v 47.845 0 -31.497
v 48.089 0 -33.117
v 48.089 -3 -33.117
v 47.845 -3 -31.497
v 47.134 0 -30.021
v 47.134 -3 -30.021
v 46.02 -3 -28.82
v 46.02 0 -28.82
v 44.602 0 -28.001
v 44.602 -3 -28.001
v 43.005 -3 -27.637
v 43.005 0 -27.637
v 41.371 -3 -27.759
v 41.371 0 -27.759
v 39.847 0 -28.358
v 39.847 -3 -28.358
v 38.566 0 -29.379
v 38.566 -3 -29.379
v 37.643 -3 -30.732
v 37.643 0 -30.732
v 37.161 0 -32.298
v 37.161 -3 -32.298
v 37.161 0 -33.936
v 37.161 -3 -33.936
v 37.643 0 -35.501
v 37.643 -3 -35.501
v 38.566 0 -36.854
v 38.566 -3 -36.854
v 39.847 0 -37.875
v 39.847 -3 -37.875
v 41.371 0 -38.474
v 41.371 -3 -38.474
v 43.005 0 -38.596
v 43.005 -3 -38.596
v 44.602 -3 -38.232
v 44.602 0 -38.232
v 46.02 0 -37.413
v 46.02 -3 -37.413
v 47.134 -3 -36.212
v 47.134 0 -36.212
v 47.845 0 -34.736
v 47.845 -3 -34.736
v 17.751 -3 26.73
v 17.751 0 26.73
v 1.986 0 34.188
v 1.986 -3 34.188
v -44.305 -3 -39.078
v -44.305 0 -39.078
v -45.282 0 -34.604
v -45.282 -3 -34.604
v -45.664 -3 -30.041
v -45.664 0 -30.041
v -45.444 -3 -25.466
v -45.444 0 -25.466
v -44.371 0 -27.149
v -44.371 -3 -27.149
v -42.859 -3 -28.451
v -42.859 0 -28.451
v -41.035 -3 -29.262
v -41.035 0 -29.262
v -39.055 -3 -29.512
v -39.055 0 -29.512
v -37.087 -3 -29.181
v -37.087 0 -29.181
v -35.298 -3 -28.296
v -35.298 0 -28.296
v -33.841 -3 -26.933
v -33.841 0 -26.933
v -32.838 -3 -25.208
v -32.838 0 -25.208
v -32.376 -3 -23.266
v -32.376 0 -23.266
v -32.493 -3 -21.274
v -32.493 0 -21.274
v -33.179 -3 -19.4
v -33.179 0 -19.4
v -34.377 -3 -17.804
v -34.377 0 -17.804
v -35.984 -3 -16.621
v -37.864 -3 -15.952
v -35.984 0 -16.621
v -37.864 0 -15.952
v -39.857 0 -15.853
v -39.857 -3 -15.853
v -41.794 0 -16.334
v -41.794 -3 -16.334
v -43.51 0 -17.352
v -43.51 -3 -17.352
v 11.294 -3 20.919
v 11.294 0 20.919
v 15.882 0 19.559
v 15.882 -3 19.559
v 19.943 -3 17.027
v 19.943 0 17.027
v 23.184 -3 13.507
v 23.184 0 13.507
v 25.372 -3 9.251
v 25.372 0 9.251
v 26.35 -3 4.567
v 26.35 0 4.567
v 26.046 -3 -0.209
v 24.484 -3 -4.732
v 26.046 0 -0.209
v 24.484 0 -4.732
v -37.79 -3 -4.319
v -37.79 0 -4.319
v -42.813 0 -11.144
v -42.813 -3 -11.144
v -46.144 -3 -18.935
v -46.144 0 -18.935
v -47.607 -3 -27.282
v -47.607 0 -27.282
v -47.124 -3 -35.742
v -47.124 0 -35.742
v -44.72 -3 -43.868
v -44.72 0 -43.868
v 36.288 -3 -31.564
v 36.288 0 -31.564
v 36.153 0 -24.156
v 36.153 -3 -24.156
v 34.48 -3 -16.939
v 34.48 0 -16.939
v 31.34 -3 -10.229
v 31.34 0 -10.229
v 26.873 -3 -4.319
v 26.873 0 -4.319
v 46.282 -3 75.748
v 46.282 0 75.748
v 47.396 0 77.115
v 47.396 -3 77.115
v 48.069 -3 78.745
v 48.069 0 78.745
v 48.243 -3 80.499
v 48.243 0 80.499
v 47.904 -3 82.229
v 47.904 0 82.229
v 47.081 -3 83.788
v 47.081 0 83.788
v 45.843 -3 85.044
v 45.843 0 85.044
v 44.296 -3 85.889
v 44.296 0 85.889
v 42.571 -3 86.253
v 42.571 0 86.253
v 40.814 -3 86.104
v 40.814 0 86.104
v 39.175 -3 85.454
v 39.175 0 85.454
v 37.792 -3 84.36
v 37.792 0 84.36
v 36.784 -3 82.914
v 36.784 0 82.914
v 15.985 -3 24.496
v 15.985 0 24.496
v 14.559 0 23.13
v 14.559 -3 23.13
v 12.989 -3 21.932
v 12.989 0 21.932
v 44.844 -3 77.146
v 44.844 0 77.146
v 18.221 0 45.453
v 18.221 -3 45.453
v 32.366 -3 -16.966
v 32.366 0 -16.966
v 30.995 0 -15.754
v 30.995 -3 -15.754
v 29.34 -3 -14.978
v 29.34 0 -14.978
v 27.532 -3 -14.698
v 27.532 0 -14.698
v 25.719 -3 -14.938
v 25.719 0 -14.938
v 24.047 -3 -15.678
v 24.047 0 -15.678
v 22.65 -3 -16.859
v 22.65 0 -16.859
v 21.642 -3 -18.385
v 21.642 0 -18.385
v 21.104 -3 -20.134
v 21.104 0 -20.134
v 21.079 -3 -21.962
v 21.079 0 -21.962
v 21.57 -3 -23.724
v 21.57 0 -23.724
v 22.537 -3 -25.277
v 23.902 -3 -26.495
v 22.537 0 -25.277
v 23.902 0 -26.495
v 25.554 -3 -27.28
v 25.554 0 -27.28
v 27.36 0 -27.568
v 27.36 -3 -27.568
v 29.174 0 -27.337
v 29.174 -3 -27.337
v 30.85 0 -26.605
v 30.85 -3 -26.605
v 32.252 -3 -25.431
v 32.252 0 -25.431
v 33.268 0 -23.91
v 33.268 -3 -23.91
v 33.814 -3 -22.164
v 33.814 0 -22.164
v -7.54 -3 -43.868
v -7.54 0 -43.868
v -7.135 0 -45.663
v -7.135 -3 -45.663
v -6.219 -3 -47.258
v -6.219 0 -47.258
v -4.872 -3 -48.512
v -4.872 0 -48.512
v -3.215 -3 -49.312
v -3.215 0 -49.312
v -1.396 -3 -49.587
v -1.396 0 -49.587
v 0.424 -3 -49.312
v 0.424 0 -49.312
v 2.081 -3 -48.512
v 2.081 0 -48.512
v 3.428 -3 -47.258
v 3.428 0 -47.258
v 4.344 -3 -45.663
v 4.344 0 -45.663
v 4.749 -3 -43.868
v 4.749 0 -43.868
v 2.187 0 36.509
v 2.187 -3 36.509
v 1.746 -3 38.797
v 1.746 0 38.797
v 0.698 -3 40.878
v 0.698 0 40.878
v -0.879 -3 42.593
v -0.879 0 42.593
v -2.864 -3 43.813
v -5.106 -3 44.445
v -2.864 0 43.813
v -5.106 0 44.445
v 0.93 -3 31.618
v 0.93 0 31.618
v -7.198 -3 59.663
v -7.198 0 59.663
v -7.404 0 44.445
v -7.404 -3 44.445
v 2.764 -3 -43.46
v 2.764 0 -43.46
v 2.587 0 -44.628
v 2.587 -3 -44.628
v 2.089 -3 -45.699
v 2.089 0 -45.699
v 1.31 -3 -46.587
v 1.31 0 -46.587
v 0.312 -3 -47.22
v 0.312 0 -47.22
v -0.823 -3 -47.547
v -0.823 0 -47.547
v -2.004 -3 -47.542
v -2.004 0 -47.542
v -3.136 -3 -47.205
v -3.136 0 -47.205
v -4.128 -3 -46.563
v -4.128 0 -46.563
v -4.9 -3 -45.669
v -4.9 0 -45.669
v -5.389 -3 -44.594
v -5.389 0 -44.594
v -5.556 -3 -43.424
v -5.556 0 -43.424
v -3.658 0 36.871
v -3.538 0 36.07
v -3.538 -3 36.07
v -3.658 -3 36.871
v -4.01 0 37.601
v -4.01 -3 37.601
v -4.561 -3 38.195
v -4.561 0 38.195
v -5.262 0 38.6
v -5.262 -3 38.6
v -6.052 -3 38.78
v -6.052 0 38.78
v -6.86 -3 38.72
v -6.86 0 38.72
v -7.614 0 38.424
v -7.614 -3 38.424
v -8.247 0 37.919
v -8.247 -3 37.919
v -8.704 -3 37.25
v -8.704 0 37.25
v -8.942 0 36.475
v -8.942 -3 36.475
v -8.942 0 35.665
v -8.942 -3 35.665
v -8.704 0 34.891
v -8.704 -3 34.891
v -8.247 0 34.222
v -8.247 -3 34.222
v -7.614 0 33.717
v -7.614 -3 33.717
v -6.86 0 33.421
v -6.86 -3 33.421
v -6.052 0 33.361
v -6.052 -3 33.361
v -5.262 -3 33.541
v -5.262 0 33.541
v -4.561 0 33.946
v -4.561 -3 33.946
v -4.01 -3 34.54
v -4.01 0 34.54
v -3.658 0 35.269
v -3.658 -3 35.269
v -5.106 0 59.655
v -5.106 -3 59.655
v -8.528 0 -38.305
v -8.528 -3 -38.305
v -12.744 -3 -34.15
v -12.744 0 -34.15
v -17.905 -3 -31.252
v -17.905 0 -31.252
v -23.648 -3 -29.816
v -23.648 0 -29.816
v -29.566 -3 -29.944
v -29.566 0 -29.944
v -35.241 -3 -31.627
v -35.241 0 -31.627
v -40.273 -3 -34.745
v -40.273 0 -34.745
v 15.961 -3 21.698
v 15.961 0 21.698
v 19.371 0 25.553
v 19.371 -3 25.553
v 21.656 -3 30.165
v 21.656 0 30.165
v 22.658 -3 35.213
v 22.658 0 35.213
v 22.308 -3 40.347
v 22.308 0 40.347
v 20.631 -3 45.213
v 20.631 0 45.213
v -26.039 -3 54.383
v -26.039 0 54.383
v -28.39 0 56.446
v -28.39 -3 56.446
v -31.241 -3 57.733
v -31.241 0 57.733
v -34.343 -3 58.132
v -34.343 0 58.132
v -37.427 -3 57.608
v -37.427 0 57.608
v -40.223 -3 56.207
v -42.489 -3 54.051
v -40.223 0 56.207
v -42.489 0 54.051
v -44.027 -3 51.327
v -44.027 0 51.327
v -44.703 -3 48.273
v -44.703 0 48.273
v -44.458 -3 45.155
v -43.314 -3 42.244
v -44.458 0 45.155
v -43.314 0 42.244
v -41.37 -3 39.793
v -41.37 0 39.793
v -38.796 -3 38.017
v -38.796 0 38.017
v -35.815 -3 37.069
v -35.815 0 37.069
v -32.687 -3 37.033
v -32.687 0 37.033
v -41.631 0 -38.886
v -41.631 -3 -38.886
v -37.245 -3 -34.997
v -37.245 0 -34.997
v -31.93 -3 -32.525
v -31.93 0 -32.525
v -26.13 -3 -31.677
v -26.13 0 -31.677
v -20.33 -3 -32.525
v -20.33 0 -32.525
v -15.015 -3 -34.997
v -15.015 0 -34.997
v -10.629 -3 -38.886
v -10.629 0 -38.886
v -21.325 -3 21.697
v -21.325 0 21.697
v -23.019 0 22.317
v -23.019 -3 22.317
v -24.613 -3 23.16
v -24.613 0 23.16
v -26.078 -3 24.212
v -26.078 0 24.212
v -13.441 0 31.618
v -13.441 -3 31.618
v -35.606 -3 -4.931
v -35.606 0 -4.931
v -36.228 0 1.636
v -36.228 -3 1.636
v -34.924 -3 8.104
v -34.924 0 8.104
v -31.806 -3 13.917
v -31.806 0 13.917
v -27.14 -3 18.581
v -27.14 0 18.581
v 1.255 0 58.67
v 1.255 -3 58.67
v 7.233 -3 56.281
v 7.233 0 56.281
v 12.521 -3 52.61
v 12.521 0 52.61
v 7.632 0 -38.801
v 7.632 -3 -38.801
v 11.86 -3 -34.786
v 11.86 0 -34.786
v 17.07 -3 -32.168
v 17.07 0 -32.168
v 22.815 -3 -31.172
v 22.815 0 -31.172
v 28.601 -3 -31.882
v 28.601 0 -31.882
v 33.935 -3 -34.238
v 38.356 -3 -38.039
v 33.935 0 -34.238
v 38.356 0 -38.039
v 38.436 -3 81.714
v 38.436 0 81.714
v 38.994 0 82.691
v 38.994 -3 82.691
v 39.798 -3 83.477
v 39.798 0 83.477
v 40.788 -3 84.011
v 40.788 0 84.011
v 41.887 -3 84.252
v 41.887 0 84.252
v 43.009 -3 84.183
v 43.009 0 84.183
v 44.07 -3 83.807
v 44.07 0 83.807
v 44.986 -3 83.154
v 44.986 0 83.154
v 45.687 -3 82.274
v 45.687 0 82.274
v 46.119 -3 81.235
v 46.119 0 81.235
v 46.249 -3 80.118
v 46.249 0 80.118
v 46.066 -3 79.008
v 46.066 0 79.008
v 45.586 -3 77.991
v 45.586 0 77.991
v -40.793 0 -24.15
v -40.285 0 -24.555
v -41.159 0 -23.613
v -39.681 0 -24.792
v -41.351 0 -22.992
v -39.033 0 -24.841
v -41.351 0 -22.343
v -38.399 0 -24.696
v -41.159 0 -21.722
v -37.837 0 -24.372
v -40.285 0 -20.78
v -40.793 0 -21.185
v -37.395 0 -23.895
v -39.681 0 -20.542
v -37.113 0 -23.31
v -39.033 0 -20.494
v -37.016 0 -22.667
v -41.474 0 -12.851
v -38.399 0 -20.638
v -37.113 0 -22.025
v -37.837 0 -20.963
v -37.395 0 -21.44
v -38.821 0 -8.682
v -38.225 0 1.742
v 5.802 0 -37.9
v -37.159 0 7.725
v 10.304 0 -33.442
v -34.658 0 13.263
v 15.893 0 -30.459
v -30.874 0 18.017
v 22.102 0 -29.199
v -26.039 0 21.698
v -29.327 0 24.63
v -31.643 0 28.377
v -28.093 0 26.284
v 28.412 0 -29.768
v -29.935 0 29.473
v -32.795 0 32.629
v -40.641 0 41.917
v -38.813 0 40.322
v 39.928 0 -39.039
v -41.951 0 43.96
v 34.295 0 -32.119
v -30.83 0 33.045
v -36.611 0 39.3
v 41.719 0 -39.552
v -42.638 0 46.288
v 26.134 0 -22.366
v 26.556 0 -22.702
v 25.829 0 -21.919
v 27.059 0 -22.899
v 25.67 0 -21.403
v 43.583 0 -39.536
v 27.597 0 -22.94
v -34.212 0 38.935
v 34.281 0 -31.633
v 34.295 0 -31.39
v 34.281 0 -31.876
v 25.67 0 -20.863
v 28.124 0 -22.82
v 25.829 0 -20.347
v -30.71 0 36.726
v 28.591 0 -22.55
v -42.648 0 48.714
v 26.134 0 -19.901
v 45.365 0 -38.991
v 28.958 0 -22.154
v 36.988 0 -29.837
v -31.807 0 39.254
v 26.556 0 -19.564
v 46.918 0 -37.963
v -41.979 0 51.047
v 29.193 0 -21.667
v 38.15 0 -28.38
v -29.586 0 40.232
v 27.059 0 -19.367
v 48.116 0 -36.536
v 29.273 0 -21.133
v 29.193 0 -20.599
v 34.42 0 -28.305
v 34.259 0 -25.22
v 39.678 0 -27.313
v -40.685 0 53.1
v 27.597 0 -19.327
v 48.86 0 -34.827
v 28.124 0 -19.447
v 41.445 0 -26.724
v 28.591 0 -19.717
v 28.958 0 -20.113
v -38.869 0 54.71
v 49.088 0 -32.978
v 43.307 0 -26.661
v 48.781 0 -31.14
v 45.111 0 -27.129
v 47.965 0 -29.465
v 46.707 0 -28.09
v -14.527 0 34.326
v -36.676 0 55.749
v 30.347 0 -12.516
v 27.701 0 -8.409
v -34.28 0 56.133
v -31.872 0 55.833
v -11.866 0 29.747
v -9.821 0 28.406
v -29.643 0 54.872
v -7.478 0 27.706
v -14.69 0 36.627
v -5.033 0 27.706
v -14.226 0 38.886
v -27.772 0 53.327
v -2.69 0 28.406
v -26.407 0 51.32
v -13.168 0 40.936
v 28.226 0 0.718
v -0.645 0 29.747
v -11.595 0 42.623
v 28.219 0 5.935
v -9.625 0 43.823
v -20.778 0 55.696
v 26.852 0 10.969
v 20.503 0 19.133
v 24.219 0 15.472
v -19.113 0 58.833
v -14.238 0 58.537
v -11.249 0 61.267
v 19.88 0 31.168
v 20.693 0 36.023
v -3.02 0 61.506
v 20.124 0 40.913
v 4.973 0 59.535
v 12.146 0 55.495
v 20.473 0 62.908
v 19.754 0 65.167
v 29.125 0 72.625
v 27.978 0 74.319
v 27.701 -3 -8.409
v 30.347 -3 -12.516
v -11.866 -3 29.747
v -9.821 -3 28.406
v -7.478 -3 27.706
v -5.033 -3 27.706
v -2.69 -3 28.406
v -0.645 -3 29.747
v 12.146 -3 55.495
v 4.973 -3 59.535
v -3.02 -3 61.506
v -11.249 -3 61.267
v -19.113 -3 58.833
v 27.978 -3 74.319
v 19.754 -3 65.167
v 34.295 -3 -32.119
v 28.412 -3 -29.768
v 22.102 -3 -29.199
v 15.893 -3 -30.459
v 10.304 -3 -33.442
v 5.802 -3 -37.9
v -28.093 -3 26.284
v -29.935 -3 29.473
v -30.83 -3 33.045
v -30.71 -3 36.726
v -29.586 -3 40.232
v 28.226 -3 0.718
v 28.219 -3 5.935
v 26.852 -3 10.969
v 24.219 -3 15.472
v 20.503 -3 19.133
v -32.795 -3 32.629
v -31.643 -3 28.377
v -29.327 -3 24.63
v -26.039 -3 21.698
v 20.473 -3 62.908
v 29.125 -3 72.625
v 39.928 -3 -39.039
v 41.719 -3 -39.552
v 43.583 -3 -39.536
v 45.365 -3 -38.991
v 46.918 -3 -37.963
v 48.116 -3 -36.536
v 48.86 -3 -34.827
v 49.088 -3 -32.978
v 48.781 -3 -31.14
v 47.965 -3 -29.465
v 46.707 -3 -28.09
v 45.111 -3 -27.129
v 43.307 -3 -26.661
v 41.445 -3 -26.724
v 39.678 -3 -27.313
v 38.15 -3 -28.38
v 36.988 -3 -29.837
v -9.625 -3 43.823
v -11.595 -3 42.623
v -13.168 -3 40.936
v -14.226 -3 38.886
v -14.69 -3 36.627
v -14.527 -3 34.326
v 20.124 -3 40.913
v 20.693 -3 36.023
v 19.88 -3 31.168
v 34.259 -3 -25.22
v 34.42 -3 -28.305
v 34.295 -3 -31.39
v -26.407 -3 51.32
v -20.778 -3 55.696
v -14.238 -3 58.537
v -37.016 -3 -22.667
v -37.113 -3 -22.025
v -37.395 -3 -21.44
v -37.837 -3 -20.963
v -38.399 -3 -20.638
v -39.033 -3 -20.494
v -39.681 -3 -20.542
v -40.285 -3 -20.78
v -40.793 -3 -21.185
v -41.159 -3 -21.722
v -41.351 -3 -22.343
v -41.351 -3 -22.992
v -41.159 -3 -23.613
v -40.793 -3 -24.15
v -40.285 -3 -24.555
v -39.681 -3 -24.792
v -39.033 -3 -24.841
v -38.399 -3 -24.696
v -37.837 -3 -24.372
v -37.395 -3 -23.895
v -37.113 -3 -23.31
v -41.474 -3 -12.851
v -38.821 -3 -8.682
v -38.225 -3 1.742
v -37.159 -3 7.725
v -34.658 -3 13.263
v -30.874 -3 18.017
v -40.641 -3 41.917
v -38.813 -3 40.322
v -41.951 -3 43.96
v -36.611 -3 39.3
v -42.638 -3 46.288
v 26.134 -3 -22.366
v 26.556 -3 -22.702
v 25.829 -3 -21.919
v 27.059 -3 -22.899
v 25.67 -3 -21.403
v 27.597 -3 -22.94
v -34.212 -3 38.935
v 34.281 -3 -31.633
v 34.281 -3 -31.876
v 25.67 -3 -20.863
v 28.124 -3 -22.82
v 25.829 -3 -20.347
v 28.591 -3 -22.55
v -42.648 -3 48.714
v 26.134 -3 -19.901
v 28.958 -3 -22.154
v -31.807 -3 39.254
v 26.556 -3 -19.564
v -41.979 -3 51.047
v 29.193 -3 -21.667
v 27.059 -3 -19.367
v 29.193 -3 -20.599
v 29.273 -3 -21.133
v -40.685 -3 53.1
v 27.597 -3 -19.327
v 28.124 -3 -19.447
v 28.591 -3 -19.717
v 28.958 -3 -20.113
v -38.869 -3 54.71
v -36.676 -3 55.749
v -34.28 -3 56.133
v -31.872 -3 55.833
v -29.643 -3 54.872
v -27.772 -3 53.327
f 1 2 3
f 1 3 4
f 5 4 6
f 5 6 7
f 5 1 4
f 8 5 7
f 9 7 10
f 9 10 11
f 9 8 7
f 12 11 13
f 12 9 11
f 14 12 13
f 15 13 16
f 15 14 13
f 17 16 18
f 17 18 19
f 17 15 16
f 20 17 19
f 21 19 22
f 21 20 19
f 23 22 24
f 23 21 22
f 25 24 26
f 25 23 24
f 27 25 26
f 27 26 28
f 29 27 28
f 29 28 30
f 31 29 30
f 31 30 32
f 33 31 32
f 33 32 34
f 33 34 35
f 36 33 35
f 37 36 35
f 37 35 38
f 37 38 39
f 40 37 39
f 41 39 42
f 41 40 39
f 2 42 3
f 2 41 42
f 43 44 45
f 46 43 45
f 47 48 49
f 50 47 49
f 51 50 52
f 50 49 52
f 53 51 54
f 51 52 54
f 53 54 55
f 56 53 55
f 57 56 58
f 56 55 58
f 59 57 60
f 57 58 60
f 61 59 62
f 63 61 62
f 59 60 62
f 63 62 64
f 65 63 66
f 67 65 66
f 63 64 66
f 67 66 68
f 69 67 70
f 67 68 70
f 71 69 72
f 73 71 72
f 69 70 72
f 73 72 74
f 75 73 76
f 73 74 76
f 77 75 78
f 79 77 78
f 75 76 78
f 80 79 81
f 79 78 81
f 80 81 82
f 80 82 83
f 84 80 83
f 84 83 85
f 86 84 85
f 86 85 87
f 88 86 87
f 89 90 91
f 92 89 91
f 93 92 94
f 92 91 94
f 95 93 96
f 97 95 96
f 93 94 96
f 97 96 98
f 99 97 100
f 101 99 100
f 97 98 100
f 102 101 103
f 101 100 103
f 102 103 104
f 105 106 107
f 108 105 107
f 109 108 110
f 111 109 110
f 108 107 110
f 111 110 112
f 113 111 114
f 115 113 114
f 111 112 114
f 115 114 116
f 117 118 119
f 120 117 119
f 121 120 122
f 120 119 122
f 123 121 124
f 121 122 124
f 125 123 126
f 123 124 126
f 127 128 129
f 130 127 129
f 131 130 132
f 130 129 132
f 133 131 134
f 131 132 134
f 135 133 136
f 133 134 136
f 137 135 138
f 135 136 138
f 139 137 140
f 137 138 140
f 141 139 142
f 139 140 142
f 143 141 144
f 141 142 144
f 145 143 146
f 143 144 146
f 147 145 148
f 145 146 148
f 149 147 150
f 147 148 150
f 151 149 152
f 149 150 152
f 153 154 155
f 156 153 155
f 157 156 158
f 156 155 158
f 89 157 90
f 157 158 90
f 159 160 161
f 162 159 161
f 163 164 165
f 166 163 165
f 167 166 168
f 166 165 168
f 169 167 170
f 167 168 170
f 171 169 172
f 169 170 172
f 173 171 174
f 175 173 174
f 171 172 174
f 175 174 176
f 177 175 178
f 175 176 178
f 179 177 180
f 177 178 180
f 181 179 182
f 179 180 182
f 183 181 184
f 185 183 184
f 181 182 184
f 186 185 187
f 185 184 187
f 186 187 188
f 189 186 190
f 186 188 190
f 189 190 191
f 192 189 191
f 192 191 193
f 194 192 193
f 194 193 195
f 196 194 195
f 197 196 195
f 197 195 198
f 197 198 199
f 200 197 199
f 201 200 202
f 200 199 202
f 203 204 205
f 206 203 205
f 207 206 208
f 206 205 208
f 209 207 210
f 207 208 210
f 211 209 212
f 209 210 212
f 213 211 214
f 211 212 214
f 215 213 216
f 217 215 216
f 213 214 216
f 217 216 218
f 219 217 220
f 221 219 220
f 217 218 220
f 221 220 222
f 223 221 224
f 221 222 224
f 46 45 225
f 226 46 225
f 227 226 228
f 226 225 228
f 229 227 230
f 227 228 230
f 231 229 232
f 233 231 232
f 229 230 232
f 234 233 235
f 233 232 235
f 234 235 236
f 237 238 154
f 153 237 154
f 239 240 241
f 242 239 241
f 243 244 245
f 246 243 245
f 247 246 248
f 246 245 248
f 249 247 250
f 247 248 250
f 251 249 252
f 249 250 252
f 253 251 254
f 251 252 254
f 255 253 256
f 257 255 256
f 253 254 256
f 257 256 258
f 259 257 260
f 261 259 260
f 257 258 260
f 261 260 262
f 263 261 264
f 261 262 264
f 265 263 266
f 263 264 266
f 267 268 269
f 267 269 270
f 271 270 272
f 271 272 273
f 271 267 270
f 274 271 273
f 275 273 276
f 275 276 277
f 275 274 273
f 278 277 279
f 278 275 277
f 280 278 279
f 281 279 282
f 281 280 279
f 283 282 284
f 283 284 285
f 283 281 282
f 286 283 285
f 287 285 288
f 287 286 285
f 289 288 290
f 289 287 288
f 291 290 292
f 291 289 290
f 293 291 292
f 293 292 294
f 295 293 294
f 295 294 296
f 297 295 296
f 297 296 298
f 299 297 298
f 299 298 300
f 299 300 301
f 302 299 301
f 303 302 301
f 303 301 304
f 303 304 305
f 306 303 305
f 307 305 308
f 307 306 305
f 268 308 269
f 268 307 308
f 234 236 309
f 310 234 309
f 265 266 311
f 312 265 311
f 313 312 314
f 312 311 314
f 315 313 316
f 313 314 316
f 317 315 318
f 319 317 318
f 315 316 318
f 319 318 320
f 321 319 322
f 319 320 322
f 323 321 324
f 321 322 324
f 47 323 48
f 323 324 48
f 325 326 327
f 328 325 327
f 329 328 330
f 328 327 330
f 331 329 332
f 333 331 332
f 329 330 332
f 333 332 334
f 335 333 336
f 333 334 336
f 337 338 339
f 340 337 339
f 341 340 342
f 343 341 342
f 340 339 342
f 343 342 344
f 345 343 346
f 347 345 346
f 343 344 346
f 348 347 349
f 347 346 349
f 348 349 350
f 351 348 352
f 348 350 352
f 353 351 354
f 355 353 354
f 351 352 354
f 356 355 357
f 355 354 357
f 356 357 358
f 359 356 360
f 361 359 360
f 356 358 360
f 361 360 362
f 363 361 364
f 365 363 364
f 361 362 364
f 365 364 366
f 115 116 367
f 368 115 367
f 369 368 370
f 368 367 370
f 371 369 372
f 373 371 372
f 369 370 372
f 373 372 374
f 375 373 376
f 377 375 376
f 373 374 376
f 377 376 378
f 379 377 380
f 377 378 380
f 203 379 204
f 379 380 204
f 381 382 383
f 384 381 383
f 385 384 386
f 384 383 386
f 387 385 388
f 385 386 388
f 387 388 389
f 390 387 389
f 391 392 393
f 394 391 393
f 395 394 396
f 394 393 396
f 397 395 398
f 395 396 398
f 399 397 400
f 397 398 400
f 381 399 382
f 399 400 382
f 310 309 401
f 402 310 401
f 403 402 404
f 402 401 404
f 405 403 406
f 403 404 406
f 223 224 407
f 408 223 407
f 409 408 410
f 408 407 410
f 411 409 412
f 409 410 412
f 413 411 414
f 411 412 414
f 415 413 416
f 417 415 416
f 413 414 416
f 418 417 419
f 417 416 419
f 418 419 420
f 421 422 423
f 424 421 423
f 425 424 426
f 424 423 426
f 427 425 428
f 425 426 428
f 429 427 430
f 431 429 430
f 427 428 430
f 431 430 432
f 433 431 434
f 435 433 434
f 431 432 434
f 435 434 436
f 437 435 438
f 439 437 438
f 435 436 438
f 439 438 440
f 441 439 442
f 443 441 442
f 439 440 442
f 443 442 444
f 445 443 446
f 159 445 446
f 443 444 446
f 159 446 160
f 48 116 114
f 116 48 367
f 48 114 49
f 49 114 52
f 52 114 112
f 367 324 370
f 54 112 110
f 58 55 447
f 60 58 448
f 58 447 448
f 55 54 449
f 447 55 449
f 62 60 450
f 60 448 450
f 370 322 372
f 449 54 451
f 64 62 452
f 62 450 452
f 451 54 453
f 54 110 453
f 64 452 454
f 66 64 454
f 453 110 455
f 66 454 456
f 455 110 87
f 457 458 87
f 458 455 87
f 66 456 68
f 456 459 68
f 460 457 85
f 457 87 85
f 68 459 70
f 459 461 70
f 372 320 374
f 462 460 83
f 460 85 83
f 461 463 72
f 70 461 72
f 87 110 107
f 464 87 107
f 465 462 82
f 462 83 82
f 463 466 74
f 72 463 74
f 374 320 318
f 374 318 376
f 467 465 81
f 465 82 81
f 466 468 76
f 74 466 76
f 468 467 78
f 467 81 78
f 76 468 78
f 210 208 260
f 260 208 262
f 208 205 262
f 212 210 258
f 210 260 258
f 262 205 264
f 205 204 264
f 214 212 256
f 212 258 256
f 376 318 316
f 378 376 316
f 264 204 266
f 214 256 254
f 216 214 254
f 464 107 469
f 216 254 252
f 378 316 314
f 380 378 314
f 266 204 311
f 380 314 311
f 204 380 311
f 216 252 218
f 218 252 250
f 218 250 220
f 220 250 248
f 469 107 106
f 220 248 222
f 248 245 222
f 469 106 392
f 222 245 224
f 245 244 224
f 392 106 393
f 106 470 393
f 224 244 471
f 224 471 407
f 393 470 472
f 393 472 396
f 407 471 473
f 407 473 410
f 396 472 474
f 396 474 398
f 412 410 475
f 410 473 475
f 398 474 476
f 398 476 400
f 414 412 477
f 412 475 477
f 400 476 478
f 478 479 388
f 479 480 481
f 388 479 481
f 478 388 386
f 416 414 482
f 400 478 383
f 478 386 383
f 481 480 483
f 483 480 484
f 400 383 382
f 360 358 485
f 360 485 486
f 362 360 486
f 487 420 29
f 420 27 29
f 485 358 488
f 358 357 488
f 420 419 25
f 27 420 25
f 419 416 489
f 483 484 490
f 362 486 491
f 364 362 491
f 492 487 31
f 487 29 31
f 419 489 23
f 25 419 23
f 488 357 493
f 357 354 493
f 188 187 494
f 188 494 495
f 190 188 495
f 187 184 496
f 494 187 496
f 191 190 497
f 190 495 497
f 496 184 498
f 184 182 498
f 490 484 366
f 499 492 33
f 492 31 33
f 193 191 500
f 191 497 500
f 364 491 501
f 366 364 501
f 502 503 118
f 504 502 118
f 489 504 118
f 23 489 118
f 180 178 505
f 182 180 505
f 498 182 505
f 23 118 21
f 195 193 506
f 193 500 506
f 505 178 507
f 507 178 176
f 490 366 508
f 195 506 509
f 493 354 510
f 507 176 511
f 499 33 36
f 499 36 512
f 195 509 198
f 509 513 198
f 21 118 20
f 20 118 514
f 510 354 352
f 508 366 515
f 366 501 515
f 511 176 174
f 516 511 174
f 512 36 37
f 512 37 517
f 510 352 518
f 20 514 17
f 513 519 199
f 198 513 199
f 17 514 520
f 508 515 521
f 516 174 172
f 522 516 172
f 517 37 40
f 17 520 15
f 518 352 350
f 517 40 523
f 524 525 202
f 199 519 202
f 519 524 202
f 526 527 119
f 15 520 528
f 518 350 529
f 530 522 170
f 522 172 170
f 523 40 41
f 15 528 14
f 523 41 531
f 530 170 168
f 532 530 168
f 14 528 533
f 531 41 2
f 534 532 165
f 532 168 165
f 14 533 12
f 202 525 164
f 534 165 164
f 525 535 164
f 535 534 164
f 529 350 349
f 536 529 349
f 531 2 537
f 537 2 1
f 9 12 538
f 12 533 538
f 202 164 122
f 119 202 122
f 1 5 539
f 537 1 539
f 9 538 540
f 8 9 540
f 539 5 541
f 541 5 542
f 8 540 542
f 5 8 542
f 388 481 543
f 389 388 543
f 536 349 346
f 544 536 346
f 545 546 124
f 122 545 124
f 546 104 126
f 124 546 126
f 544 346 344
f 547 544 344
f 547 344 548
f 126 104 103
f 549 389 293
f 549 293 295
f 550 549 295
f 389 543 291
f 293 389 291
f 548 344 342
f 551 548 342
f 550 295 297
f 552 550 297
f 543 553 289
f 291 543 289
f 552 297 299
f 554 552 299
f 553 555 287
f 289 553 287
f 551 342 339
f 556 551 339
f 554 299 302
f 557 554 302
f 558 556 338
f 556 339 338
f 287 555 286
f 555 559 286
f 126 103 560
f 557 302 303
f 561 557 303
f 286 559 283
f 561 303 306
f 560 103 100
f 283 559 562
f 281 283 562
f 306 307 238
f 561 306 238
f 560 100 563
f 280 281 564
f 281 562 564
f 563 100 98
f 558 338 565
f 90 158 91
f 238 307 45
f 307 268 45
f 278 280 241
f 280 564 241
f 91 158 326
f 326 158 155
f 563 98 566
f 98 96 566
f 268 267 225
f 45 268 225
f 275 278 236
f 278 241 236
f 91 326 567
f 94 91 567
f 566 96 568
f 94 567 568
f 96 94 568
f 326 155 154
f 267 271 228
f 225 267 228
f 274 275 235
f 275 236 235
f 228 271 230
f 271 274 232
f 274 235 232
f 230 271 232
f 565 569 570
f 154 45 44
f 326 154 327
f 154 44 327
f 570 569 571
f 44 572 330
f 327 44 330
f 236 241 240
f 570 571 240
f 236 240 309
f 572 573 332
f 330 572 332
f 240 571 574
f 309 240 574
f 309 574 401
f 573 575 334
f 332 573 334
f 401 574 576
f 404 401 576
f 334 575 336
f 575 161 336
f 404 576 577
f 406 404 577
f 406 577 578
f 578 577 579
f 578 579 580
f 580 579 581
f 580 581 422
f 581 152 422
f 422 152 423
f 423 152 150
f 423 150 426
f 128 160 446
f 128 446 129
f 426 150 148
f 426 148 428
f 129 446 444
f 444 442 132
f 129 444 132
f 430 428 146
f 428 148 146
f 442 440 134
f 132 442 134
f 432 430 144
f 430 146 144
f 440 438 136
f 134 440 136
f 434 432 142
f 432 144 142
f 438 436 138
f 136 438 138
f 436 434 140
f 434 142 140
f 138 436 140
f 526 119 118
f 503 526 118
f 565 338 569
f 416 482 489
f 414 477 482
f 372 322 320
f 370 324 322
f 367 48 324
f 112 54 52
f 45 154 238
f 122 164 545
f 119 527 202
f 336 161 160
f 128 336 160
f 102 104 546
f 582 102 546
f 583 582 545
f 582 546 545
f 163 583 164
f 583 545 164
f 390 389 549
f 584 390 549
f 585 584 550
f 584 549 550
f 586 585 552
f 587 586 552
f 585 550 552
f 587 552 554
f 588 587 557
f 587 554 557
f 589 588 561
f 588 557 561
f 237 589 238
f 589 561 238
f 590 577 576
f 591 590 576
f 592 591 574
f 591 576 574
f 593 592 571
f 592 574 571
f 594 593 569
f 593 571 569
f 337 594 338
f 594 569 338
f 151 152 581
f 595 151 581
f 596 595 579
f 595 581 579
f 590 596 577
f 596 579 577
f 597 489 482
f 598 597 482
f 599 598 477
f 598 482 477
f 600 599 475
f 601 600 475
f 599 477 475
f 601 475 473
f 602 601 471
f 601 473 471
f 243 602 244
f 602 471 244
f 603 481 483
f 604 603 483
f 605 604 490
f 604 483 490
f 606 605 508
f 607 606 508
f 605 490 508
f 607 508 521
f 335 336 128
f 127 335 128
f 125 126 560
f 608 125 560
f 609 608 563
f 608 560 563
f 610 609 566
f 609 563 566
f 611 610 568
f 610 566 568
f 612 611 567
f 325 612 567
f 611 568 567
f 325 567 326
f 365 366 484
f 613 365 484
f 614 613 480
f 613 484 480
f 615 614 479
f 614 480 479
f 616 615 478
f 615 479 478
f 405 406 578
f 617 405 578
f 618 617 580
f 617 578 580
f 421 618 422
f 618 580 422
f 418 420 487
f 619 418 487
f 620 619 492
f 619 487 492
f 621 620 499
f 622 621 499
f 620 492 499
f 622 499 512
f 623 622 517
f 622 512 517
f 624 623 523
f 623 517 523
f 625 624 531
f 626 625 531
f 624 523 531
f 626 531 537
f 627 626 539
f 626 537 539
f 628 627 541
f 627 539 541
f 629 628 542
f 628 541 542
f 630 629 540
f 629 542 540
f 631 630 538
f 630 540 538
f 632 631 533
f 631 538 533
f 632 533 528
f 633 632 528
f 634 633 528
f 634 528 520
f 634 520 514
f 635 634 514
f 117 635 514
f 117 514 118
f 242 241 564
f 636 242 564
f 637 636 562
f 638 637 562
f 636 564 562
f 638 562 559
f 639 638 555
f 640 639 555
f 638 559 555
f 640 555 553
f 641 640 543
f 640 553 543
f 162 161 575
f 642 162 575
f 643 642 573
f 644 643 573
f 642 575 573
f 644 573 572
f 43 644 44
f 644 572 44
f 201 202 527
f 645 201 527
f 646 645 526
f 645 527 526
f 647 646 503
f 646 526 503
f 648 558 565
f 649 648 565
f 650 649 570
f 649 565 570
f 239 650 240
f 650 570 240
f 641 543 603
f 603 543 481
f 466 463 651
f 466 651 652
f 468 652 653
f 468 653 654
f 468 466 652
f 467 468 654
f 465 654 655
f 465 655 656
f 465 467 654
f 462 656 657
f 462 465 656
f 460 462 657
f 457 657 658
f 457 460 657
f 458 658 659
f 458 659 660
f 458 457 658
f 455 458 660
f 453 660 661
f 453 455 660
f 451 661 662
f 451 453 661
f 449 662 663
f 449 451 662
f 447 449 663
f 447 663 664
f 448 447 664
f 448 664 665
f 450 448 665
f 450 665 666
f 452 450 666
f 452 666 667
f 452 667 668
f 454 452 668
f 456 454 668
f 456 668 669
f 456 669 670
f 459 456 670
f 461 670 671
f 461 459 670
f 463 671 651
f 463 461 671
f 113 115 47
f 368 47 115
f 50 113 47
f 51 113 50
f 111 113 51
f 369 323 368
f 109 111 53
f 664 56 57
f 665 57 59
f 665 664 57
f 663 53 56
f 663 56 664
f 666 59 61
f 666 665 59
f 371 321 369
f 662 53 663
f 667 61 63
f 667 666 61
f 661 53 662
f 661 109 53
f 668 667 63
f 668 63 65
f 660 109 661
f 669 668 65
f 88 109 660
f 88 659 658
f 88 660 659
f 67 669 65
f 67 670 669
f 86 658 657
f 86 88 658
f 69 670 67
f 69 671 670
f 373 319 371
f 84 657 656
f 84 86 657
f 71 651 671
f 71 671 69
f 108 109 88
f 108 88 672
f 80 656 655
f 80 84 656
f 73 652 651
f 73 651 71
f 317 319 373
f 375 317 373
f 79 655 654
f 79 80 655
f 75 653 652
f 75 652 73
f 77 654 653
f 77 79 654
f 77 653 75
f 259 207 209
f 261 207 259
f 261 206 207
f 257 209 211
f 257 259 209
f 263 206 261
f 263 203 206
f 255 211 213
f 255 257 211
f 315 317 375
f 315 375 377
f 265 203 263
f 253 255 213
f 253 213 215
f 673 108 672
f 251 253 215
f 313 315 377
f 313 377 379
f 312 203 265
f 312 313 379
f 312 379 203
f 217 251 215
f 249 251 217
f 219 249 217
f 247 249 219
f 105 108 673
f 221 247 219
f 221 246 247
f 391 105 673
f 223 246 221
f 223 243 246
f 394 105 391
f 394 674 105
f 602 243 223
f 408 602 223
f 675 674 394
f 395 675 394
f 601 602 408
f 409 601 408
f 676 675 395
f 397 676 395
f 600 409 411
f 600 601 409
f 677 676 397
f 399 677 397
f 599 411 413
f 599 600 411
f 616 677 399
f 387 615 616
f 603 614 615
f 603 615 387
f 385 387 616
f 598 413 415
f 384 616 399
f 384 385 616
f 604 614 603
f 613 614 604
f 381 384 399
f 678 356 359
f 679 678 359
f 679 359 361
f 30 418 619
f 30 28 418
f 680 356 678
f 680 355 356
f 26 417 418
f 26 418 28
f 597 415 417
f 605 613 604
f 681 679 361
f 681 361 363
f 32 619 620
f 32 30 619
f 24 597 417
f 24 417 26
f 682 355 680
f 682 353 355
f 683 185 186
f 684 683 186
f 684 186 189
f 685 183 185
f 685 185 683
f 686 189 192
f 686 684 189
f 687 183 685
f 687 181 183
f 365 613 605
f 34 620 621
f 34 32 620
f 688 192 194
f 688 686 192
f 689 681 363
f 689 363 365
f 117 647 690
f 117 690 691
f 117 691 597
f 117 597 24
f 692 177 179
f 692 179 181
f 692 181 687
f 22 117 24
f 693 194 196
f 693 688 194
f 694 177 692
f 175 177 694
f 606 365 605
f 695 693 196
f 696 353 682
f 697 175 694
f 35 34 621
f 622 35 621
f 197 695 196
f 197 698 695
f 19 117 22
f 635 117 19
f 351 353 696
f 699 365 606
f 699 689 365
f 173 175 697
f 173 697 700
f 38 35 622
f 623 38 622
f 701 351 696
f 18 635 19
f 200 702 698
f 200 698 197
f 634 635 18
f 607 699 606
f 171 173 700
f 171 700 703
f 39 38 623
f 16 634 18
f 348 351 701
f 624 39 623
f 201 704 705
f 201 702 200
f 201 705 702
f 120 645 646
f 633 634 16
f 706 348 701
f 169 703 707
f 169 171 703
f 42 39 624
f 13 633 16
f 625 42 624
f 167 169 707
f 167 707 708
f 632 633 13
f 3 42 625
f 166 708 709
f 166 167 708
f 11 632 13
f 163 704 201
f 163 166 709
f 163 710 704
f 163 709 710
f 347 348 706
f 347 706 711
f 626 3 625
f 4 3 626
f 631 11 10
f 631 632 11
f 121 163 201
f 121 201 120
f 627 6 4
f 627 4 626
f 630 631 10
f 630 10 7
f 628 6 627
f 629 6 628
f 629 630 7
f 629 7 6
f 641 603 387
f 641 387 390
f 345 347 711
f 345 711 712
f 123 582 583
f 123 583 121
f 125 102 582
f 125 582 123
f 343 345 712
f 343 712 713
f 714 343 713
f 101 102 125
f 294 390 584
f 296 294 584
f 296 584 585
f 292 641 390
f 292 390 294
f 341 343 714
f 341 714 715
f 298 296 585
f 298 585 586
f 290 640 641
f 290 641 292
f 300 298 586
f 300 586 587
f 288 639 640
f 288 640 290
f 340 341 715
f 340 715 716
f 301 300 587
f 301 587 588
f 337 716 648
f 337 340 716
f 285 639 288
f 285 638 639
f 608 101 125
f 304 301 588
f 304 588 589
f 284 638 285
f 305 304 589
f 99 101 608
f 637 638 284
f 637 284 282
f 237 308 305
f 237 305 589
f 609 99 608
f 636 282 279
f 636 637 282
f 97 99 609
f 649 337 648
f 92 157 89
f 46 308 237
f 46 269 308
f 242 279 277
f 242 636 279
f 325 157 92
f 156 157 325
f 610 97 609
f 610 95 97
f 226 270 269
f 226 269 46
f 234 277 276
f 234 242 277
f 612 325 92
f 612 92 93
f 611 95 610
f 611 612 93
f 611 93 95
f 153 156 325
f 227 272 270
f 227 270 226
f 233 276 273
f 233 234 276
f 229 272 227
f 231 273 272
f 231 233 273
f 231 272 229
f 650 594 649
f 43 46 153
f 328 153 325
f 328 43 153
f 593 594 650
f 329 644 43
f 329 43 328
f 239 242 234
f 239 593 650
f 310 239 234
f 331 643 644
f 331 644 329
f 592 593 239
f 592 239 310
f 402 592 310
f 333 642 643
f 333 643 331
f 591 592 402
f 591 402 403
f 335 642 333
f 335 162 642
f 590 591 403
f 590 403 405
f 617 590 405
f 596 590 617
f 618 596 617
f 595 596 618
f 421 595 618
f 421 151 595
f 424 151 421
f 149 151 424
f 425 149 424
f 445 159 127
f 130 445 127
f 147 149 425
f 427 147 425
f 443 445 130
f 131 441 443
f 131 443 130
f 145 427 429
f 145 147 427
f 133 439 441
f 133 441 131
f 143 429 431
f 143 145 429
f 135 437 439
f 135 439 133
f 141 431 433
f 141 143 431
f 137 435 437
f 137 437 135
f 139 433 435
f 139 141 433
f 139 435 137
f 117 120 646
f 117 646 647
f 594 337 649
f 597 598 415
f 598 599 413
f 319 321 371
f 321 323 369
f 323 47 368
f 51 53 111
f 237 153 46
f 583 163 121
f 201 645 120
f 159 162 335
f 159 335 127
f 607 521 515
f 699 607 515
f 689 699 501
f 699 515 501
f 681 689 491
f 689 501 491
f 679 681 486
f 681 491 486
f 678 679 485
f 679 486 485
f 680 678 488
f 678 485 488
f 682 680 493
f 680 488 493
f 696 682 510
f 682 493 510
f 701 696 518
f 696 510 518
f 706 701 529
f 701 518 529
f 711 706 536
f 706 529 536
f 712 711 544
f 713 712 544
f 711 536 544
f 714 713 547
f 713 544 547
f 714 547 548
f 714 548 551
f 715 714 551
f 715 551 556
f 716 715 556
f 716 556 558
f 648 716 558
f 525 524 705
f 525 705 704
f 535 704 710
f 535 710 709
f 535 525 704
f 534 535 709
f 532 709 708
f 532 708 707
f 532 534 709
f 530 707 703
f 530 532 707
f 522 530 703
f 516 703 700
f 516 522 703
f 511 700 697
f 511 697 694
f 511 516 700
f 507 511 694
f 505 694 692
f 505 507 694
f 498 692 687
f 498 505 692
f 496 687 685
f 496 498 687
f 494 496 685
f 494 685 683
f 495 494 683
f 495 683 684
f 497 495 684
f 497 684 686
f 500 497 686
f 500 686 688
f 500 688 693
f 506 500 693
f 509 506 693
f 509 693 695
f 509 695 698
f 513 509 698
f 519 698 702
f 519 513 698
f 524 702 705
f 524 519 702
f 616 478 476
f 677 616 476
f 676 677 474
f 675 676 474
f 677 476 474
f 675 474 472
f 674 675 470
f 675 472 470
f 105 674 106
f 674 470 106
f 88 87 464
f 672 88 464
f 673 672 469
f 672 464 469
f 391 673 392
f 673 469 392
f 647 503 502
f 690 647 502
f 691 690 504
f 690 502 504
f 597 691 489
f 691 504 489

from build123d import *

# Parameters (mm, degrees)
F0_R     = 2.179644
F0_R_2   = 5.495
F0_R_3   = 1.811627
F0_R_4   = 2.717522
F1_DEPTH = 3


with BuildPart() as f1:
    # F0 (on Front) → F1 (new body)
    with BuildSketch(Plane.XZ):
        with BuildLine():
            ThreePointArc((4.748624, -43.868074), (19.905522, -31.458489), (38.356329, -38.03854))
            ThreePointArc((38.356329, -38.03854), (48.781106, -31.139926), (36.287612, -31.563568))
            ThreePointArc((36.287612, -31.563568), (34.479775, -16.939453), (26.872979, -4.319244))
            ThreePointArc((26.872979, -4.319244), (26.851679, 10.968683), (15.96134, 21.69816))
            ThreePointArc((15.96134, 21.69816), (22.323636, 32.655587), (20.63084, 45.212594))
            Line((20.63084, 45.212594), (46.282084, 75.748279))
            ThreePointArc((46.282084, 75.748279), (45.843056, 85.044031), (36.784028, 82.913828))
            ThreePointArc((36.784028, 82.913828), (23.791047, 69.810118), (12.145666, 55.495445))
            ThreePointArc((12.145666, 55.495445), (-7.14242, 61.665744), (-26.03866, 54.383233))
            ThreePointArc((-26.03866, 54.383233), (-44.027199, 51.327224), (-32.686998, 37.03294))
            ThreePointArc((-32.686998, 37.03294), (-31.643455, 28.376793), (-26.03866, 21.69816))
            ThreePointArc((-26.03866, 21.69816), (-36.080562, 10.571243), (-37.789793, -4.319244))
            ThreePointArc((-37.789793, -4.319244), (-47.116357, -23.066533), (-44.720202, -43.868074))
            ThreePointArc((-44.720202, -43.868074), (-26.129955, -31.677407), (-7.539708, -43.868074))
            ThreePointArc((-7.539708, -43.868074), (-1.395542, -49.586683), (4.748624, -43.868074))
        make_face()
        with Locations((-39.195588, -22.667399)):
            Circle(F0_R, mode=Mode.SUBTRACT)
        with BuildLine():
            ThreePointArc((2.764325, -43.460141), (-1.413553, -47.586646), (-5.555543, -43.424121))
            ThreePointArc((-5.555543, -43.424121), (-23.64801, -29.816144), (-44.305303, -39.078469))
            ThreePointArc((-44.305303, -39.078469), (-45.548112, -32.328702), (-45.443616, -25.466268))
            ThreePointArc((-45.443616, -25.466268), (-32.535702, -24.254044), (-43.510487, -17.352027))
            ThreePointArc((-43.510487, -17.352027), (-40.221713, -10.719441), (-35.605799, -4.931473))
            ThreePointArc((-35.605799, -4.931473), (-33.578613, 11.124985), (-21.324643, 21.696624))
            ThreePointArc((-21.324643, 21.696624), (-23.830093, 22.711263), (-26.078436, 24.211837))
            Line((-26.078436, 24.211837), (-13.440696, 31.617877))
            ThreePointArc((-13.440696, 31.617877), (-6.255235, 27.617264), (0.930225, 31.617877))
            Line((0.930225, 31.617877), (15.984657, 24.496045))
            ThreePointArc((15.984657, 24.496045), (13.79085, 22.50908), (11.294313, 20.919072))
            ThreePointArc((11.294313, 20.919072), (24.421465, 11.452539), (24.483739, -4.73182))
            ThreePointArc((24.483739, -4.73182), (29.09938, -10.414096), (32.365767, -16.96567))
            ThreePointArc((32.365767, -16.96567), (21.262061, -22.860799), (33.814338, -22.164239))
            ThreePointArc((33.814338, -22.164239), (34.375369, -26.760579), (34.29513, -31.390337))
            ThreePointArc((34.29513, -31.390337), (34.279314, -31.754857), (34.29513, -32.119377))
            ThreePointArc((34.29513, -32.119377), (15.892899, -30.458566), (2.764325, -43.460141))
        make_face(mode=Mode.SUBTRACT)
        with Locations((42.594204, -33.116606)):
            Circle(F0_R_2, mode=Mode.SUBTRACT)
        with Locations((27.461662, -21.133294)):
            Circle(F0_R_3, mode=Mode.SUBTRACT)
        with BuildLine():
            ThreePointArc((-29.585752, 40.232415), (-42.395978, 49.904419), (-26.407067, 51.320147))
            ThreePointArc((-26.407067, 51.320147), (-17.597387, 57.321958), (-7.197797, 59.663057))
            Line((-7.197797, 59.663057), (-7.403995, 44.445188))
            ThreePointArc((-7.403995, 44.445188), (-13.167698, 40.936028), (-14.526525, 34.326333))
            Line((-14.526525, 34.326333), (-28.093472, 26.283829))
            ThreePointArc((-28.093472, 26.283829), (-30.829773, 33.045206), (-29.585752, 40.232415))
        make_face(mode=Mode.SUBTRACT)
        with Locations((-6.255235, 36.070436)):
            Circle(F0_R_4, mode=Mode.SUBTRACT)
        with BuildLine():
            Line((44.843853, 77.145583), (18.220686, 45.452904))
            ThreePointArc((18.220686, 45.452904), (20.692534, 36.023365), (17.751182, 26.729566))
            Line((17.751182, 26.729566), (1.985629, 34.18781))
            ThreePointArc((1.985629, 34.18781), (0.697801, 40.877869), (-5.106476, 44.445188))
            Line((-5.106476, 44.445188), (-5.106476, 59.655479))
            ThreePointArc((-5.106476, 59.655479), (4.312025, 57.645012), (12.521453, 52.609595))
            ThreePointArc((12.521453, 52.609595), (24.714277, 67.842383), (38.436119, 81.713713))
            ThreePointArc((38.436119, 81.713713), (44.55039, 83.512084), (44.843853, 77.145583))
        make_face(mode=Mode.SUBTRACT)
    extrude(amount=F1_DEPTH)


solid = f1.part
